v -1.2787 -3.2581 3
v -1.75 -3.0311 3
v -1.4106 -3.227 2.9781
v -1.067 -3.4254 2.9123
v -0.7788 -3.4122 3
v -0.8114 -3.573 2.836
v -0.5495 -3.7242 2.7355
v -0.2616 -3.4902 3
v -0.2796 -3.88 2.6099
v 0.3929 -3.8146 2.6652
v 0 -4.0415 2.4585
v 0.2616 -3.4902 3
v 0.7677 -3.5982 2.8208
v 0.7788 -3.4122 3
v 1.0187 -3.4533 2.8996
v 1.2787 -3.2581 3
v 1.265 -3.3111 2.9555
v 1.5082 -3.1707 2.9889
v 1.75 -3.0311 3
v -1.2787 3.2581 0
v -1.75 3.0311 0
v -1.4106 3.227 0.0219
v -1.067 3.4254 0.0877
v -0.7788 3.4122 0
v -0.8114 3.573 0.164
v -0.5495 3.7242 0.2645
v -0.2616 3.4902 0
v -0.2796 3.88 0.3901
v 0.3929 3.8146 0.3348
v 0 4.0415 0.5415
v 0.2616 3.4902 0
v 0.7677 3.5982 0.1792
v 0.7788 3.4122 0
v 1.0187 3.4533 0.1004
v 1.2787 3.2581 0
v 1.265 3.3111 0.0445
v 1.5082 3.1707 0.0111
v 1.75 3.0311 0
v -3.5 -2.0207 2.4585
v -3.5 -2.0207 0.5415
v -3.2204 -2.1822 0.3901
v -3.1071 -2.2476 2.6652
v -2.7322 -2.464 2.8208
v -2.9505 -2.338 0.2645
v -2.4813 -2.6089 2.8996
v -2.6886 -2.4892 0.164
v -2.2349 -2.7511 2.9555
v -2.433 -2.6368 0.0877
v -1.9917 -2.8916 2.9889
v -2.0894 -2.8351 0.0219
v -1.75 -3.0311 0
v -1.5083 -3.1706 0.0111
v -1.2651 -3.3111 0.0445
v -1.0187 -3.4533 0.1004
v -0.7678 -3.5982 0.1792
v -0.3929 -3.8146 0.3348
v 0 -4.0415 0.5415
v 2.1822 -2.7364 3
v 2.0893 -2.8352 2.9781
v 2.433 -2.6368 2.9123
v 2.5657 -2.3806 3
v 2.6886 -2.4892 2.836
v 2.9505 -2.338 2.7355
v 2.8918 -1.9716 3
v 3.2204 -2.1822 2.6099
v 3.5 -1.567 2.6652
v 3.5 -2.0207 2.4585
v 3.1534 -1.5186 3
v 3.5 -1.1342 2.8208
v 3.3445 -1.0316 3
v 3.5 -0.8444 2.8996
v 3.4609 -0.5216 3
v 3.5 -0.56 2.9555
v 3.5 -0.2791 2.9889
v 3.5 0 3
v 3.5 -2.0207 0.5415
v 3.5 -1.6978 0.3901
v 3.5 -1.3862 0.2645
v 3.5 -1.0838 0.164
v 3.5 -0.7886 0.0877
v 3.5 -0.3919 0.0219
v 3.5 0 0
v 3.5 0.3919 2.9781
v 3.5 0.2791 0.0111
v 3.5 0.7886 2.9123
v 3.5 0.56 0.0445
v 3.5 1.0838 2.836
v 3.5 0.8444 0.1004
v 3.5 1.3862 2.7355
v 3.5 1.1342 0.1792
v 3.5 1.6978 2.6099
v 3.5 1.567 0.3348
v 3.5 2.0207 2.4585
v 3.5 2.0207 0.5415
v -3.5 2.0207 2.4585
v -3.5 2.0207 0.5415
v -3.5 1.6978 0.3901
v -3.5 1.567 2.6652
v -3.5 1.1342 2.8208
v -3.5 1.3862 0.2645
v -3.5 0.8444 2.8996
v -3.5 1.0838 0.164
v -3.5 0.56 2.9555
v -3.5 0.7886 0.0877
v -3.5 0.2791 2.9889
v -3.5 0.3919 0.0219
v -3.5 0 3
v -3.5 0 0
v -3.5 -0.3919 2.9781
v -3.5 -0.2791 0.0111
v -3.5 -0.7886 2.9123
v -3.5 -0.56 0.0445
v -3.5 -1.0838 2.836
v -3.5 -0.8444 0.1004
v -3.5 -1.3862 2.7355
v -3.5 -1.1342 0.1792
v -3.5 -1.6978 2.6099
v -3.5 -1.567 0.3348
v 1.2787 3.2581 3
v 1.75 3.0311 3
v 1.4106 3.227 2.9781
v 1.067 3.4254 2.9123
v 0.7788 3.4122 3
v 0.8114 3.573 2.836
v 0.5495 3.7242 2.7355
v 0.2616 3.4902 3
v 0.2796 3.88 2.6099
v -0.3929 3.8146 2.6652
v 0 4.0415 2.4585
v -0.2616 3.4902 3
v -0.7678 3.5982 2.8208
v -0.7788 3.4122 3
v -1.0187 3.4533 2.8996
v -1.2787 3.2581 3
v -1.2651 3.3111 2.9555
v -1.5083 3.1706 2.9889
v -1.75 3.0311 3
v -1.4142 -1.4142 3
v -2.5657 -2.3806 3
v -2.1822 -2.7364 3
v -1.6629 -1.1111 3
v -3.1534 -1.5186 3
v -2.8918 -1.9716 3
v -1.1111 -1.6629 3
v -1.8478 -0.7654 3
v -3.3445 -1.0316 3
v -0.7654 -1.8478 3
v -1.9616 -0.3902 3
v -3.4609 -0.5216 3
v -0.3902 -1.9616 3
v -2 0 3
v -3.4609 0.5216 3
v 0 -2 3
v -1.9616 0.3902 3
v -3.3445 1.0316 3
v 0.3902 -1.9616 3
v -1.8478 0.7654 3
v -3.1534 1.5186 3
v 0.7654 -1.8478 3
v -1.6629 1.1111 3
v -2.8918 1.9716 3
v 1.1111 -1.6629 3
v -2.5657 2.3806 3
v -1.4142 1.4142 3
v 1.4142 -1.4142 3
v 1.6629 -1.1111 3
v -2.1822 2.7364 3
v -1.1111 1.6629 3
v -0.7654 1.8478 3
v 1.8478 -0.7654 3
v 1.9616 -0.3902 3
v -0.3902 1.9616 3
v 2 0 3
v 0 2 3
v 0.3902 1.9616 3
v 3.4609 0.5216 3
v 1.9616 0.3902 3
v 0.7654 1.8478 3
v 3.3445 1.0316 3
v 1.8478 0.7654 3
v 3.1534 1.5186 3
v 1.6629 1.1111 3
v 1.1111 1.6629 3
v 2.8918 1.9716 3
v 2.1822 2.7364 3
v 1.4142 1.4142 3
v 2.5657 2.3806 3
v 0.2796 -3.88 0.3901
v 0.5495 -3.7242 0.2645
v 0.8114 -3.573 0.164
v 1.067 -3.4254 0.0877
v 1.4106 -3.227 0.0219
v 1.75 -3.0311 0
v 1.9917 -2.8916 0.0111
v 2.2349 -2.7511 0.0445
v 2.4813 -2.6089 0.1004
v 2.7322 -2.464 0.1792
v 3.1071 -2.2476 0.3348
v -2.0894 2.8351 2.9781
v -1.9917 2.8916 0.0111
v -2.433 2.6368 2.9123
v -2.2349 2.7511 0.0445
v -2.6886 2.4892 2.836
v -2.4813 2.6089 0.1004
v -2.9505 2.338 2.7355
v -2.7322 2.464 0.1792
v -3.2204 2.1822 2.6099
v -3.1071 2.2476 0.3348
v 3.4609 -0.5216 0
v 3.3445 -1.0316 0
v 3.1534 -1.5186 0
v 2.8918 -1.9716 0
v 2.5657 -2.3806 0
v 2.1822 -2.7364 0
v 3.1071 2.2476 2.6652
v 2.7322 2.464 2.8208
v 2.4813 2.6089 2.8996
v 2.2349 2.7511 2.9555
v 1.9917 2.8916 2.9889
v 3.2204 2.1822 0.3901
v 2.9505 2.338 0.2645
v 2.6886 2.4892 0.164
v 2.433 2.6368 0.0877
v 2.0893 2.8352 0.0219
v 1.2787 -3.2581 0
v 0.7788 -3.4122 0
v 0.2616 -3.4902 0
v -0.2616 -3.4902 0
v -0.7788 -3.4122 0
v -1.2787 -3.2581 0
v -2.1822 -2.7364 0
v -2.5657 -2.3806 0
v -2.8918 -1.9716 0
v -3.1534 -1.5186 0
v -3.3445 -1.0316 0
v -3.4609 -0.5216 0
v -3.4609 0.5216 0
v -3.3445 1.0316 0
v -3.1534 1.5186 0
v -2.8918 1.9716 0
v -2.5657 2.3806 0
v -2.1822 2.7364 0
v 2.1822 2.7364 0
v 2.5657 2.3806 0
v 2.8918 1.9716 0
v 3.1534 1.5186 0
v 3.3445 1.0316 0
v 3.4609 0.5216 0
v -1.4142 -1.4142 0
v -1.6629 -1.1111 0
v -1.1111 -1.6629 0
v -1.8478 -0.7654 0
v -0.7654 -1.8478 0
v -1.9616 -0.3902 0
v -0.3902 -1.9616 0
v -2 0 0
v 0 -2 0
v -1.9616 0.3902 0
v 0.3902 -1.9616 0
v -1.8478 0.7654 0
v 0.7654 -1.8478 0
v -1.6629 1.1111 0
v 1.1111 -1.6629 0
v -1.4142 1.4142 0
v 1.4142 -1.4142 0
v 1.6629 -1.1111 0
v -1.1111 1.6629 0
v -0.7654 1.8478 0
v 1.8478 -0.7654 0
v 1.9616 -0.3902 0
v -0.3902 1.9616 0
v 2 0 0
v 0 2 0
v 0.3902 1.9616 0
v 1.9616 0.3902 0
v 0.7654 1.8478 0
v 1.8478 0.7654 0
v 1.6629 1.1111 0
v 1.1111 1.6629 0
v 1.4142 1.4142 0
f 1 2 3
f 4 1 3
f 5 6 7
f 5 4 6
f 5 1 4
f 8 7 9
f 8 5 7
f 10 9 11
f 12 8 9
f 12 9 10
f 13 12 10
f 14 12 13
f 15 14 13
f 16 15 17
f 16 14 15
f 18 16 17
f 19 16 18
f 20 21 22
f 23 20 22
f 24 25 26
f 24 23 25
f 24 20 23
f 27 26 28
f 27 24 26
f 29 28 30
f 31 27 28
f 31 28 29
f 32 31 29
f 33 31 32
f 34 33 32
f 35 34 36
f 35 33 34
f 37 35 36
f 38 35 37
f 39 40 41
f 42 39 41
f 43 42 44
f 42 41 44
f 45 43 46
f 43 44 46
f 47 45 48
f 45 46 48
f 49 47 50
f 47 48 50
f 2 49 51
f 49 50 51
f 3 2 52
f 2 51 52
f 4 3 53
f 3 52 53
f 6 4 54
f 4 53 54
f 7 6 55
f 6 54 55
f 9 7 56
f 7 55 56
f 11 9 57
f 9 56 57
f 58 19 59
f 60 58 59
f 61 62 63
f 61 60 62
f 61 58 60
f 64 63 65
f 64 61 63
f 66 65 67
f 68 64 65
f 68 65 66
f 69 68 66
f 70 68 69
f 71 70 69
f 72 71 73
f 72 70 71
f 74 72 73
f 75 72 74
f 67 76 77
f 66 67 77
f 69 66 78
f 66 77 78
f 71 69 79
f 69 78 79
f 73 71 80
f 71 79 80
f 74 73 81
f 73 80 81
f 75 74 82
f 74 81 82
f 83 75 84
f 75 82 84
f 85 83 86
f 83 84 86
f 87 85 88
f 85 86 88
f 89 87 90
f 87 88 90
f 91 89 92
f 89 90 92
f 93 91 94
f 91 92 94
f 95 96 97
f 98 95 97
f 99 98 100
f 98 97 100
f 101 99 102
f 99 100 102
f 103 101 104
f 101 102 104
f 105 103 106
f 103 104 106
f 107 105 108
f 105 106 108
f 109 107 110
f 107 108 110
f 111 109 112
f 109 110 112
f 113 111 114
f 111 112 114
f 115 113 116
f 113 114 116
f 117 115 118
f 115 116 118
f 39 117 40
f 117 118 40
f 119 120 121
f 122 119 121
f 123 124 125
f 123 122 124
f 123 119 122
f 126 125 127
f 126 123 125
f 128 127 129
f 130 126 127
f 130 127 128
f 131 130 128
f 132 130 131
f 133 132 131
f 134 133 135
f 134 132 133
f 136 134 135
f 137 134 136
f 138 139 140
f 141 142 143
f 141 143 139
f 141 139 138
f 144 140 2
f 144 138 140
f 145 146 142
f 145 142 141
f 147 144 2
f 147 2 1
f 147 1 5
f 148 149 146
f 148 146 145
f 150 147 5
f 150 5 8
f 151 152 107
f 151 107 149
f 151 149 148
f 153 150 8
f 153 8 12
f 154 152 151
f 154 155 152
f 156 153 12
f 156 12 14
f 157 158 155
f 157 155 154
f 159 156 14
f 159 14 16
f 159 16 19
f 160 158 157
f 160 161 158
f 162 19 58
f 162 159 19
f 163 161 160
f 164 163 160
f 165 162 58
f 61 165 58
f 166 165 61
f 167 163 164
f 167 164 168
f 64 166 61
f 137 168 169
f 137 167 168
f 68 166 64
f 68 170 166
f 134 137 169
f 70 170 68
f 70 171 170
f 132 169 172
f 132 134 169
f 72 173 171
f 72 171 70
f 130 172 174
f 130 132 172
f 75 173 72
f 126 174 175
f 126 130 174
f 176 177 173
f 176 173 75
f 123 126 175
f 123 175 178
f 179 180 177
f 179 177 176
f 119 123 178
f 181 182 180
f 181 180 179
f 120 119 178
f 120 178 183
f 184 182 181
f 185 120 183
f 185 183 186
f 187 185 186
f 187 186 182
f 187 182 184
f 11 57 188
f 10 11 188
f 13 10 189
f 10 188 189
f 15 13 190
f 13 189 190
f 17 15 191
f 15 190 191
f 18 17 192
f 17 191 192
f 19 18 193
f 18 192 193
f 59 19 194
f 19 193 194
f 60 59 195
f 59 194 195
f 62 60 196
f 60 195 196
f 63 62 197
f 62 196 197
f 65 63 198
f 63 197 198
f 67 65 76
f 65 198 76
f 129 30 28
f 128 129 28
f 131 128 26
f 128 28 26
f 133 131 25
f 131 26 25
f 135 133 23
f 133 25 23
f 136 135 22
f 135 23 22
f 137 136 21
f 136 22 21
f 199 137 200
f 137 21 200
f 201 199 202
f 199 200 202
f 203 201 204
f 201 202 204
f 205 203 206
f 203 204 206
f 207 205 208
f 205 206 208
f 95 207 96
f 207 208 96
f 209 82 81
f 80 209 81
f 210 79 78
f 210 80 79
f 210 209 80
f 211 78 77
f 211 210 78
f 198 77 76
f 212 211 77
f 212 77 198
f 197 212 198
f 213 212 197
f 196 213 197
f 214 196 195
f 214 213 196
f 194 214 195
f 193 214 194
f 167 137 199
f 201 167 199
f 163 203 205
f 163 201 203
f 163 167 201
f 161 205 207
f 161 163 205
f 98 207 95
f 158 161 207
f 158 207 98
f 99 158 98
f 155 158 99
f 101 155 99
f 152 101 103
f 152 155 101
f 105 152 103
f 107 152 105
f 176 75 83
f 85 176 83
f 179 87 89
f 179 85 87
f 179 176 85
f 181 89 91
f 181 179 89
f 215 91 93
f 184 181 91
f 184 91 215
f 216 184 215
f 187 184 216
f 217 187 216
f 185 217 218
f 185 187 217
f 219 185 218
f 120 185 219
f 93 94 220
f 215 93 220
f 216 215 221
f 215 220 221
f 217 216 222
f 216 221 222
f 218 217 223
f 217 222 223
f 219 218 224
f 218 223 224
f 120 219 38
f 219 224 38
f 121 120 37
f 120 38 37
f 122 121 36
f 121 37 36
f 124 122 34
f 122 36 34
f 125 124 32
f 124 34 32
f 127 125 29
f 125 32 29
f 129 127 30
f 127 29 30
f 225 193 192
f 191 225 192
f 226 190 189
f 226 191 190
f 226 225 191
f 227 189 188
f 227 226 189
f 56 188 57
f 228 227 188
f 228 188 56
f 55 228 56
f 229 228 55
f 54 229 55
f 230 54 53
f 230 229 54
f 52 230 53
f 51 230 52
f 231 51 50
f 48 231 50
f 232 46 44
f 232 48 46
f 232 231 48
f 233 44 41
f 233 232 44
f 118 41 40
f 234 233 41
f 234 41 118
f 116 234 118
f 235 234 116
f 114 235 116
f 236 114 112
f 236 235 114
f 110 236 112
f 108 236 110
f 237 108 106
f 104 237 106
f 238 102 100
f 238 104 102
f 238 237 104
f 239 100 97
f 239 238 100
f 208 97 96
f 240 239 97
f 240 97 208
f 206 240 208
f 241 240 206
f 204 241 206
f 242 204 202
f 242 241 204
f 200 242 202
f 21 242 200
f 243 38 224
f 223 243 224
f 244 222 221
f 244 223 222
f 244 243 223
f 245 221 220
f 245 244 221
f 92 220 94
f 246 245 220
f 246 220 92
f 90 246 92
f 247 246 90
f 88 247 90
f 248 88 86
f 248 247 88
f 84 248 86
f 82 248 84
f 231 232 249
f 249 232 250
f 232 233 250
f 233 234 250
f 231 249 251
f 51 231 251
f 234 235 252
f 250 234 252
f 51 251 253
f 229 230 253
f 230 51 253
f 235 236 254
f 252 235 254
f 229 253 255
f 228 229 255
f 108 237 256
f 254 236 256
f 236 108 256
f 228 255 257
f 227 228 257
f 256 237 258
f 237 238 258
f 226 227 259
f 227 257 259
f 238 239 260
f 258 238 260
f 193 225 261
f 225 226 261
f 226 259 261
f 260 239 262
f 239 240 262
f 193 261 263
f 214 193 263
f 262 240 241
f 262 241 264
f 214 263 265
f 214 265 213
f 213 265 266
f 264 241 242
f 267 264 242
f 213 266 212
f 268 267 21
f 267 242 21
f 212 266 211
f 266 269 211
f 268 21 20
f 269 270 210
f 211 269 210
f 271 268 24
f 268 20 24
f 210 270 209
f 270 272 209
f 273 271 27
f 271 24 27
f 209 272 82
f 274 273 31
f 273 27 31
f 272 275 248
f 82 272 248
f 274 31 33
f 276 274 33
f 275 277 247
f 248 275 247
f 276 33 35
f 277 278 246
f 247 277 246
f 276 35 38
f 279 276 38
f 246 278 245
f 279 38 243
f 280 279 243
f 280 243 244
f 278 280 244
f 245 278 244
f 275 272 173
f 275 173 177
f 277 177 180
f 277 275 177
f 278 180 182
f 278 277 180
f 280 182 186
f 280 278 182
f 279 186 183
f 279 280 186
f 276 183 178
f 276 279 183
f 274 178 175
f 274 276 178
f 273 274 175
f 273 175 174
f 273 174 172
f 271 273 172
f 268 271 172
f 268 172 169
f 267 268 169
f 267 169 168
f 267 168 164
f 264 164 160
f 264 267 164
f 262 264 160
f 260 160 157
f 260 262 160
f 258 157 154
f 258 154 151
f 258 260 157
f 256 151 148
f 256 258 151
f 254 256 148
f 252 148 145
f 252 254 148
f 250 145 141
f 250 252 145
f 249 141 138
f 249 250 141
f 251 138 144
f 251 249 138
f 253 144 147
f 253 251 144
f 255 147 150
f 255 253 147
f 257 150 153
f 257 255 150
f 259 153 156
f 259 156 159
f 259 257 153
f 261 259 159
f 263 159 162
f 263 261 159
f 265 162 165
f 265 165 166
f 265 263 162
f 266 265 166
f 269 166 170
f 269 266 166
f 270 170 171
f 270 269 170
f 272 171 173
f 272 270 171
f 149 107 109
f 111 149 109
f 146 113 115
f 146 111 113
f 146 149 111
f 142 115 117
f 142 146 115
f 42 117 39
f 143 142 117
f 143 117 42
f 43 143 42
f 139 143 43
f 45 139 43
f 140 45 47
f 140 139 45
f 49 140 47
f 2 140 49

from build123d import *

# Parameters (mm, degrees)
SKETCH1_R               = 2
BOSS_EXTRUDE1_DEPTH     = 3
SKETCH2_OUTSIDE_W       = 17.222
SKETCH2_OUTSIDE_H       = 18.304
SKETCH2_OUTSIDE_R       = 3.5
CUT_EXTRUDE1_DEPTH      = 3
CUT_EXTRUDE1_DRAFT      = -45
MIRROR1_COPY_1_SKETCH_W = 17.222
MIRROR1_COPY_1_SKETCH_H = 18.304
MIRROR1_COPY_1_SKETCH_R = 3.5
MIRROR1_COPY_1_DEPTH    = 3
MIRROR1_COPY_1_DRAFT    = -45


with BuildPart() as part:
    # Sketch1 → Boss-Extrude1 (new body)
    with BuildSketch(Plane.XY):
        Polygon((3.5, 2.020725942), (0, 4.041451884), (-3.5, 2.020725942), (-3.5, -2.020725942), (0, -4.041451884), (3.5, -2.020725942), align=None)
        Circle(SKETCH1_R, mode=Mode.SUBTRACT)
    extrude(amount=BOSS_EXTRUDE1_DEPTH)


with BuildPart() as cut_extrude1_tool:
    # Sketch2 outside → Cut-Extrude1 (with draft: the straight prism first)
    with BuildSketch(Plane.XY.offset(3)):
        Rectangle(SKETCH2_OUTSIDE_W, SKETCH2_OUTSIDE_H)
        Circle(SKETCH2_OUTSIDE_R, mode=Mode.SUBTRACT)
    extrude(amount=-CUT_EXTRUDE1_DEPTH)
    # Cut-Extrude1: the draft: its side faces are tilted about the plane it starts from
    cut_extrude1_sides = [cut_extrude1_tool.faces().sort_by_distance(p)[0] for p in [
        (0, -9.152, 1.5),
        (8.611, 0, 1.5),
        (0, 9.152, 1.5),
        (-8.611, 0, 1.5),
        (-3.5, 0, 1.5),
    ]]
    draft(cut_extrude1_sides, Plane.XY.offset(3), CUT_EXTRUDE1_DRAFT)


with BuildPart() as part_1:
    add(part.part)

    # Cut-Extrude1: cut by cut_extrude1_tool
    add(cut_extrude1_tool.part, mode=Mode.SUBTRACT)


with BuildPart() as mirror1_copy_1_tool:
    # Mirror1 copy 1 sketch → Mirror1 copy 1 (with draft: the straight prism first)
    with BuildSketch(Plane(origin=(0, 0, 0), x_dir=(1, 0, 0), z_dir=(0, 0, -1))):
        Rectangle(MIRROR1_COPY_1_SKETCH_W, MIRROR1_COPY_1_SKETCH_H)
        Circle(MIRROR1_COPY_1_SKETCH_R, mode=Mode.SUBTRACT)
    extrude(amount=-MIRROR1_COPY_1_DEPTH)
    # Mirror1 copy 1: the draft: its side faces are tilted about the plane it starts from
    mirror1_copy_1_sides = [mirror1_copy_1_tool.faces().sort_by_distance(p)[0] for p in [
        (0, -9.152, 1.5),
        (8.611, 0, 1.5),
        (0, 9.152, 1.5),
        (-8.611, 0, 1.5),
        (-3.5, 0, 1.5),
    ]]
    draft(mirror1_copy_1_sides, Plane(origin=(0, 0, 0), x_dir=(1, 0, 0), z_dir=(0, 0, -1)), MIRROR1_COPY_1_DRAFT)


with BuildPart() as part_2:
    add(part_1.part)

    # Mirror1 copy 1: cut by mirror1_copy_1_tool
    add(mirror1_copy_1_tool.part, mode=Mode.SUBTRACT)


solid = part_2.part
